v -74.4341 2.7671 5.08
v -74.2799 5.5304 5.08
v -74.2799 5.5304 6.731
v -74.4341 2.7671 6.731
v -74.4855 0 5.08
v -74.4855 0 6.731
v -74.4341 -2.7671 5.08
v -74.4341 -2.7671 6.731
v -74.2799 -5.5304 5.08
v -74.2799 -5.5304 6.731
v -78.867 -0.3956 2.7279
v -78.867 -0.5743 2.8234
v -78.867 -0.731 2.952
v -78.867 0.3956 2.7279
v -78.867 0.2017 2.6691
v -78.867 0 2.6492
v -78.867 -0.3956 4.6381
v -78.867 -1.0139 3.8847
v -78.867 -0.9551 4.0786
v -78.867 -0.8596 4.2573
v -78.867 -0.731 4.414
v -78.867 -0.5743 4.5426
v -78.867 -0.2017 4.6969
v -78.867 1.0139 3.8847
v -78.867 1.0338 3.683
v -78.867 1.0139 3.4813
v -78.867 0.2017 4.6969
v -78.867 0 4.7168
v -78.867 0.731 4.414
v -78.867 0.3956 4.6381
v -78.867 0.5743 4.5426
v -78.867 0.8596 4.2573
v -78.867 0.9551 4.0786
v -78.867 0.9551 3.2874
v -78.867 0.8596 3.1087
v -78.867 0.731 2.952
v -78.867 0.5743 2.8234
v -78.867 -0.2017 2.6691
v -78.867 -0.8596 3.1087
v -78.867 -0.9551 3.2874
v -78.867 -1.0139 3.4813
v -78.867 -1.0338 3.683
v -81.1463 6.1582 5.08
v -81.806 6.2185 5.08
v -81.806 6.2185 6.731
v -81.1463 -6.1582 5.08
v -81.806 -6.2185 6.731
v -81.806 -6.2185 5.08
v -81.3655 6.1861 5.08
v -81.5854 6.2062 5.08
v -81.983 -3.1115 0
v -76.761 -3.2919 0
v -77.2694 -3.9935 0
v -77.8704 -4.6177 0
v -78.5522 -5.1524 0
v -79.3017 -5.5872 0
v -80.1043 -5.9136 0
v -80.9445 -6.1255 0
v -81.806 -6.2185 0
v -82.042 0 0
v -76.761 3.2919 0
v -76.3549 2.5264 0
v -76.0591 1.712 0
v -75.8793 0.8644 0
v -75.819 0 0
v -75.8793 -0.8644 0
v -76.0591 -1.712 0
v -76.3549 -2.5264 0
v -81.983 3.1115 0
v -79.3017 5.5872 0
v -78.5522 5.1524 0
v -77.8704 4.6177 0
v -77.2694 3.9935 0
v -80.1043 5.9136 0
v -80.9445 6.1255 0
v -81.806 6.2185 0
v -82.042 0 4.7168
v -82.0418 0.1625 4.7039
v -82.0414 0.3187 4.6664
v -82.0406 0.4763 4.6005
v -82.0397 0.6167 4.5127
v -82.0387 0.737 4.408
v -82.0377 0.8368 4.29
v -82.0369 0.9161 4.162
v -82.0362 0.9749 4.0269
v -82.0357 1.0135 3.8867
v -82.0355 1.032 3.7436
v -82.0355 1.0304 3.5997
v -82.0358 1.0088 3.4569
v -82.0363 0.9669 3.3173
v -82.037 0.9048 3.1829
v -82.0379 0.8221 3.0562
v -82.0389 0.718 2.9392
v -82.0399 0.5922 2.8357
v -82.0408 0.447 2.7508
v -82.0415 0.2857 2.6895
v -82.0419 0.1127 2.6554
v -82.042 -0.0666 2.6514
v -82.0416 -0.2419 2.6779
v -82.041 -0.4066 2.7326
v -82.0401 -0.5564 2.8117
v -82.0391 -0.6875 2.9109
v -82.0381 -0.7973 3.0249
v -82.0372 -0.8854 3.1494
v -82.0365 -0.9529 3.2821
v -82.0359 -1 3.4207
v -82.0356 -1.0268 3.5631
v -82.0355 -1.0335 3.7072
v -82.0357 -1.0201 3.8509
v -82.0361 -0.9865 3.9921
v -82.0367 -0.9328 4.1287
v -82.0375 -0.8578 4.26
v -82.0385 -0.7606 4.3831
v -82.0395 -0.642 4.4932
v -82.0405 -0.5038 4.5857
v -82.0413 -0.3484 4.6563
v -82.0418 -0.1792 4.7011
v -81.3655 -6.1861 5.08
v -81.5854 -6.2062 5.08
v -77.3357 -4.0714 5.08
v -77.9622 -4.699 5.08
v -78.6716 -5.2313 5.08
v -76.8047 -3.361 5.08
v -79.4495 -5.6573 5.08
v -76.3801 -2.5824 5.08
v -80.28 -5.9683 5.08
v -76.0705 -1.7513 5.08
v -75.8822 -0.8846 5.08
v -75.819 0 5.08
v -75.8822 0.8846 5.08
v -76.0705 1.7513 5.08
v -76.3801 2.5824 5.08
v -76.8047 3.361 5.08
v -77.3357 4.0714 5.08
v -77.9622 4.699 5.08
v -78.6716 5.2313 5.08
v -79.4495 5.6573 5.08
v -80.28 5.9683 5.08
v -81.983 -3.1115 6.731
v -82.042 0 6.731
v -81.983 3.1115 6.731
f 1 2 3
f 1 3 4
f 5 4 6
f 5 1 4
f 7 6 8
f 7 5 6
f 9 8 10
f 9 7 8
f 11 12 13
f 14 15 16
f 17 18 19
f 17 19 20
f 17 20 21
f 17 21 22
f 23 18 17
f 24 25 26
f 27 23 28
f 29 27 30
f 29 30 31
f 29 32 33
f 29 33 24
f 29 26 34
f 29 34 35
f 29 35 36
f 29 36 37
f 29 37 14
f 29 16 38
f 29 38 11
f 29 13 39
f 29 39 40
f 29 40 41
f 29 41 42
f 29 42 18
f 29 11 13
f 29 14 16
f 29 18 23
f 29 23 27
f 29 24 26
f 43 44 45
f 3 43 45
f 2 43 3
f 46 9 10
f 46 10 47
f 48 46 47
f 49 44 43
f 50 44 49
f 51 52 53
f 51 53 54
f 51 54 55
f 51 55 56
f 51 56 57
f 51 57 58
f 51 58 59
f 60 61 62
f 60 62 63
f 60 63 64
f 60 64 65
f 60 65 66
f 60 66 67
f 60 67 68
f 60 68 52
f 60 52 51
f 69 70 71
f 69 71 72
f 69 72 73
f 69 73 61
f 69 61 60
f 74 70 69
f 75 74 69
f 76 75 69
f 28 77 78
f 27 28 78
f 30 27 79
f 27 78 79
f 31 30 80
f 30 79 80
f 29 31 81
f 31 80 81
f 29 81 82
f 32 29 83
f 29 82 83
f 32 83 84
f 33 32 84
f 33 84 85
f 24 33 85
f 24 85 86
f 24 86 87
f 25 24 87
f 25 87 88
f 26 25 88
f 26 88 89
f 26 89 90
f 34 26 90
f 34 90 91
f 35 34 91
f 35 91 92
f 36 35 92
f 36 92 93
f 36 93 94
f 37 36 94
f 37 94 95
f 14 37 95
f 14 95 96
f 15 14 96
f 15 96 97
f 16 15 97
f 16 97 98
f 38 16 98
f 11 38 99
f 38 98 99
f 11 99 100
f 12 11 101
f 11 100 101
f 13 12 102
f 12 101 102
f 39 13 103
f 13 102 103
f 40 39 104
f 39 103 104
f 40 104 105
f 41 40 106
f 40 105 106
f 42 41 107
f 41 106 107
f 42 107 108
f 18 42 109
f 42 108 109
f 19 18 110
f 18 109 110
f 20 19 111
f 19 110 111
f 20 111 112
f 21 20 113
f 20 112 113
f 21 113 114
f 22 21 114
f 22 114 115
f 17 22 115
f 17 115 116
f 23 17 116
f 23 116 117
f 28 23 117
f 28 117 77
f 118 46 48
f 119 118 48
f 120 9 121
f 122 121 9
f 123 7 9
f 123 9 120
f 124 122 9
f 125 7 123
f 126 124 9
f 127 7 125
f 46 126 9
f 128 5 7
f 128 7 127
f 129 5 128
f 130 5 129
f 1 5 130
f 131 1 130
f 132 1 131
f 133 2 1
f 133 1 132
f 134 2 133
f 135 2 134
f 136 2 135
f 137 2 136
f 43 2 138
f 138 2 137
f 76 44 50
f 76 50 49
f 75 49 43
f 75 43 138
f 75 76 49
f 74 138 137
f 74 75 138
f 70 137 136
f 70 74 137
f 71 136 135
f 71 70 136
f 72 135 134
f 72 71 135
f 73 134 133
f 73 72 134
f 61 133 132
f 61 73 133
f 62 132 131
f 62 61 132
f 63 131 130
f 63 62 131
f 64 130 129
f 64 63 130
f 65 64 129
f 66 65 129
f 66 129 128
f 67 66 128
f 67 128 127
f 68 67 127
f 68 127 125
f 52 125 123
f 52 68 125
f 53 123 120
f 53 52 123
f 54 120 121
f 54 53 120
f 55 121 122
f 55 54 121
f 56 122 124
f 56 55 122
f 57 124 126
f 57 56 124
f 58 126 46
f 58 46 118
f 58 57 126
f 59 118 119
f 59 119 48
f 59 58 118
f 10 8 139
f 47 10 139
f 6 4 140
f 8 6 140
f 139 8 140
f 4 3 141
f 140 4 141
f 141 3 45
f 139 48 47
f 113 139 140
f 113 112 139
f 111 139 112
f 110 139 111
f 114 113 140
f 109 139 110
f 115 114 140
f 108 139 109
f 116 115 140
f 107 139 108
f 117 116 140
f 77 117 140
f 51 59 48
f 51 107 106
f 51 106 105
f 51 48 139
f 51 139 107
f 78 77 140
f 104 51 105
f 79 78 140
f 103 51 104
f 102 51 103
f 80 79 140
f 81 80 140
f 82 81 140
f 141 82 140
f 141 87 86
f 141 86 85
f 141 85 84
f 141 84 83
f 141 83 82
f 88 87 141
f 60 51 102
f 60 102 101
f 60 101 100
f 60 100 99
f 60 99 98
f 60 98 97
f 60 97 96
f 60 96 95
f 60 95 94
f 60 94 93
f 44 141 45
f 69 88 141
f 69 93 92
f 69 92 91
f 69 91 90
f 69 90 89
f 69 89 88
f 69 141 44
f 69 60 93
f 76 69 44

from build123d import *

# Parameters (mm, degrees)
BOSS_EXTRUDE1_DEPTH = 5.08
BOSS_EXTRUDE2_DEPTH = 1.651
SKETCH4_R           = 1.03378
CUT_EXTRUDE1_DEPTH  = 3.175


with BuildPart() as part:
    # Sketch2 → Boss-Extrude1 (new body)
    with BuildSketch(Plane.XY):
        with BuildLine():
            ThreePointArc((-81.80598839, 6.218522937), (-75.819, 0), (-81.80598839, -6.218522937))
            ThreePointArc((-81.80598839, -6.218522937), (-82.042, 0), (-81.80598839, 6.218522937))
        make_face()
    extrude(amount=BOSS_EXTRUDE1_DEPTH)

    # Sketch3 → Boss-Extrude2 (add)
    with BuildSketch(Plane.XY.offset(5.08)):
        with BuildLine():
            Line((-81.80598839, 6.218522937), (-74.279907283, 5.53037832))
            ThreePointArc((-74.279907283, 5.53037832), (-74.4855, 0), (-74.279907283, -5.53037832))
            Line((-74.279907283, -5.53037832), (-81.80598839, -6.218522937))
            ThreePointArc((-81.80598839, -6.218522937), (-82.042, 0), (-81.80598839, 6.218522937))
        make_face()
    extrude(amount=BOSS_EXTRUDE2_DEPTH)

    # Sketch4 → Cut-Extrude1 (cut)
    with BuildSketch(Plane.ZY.offset(82.042)):
        with Locations((3.683, 0)):
            Circle(SKETCH4_R)
    extrude(amount=-CUT_EXTRUDE1_DEPTH, mode=Mode.SUBTRACT)


solid = part.part
